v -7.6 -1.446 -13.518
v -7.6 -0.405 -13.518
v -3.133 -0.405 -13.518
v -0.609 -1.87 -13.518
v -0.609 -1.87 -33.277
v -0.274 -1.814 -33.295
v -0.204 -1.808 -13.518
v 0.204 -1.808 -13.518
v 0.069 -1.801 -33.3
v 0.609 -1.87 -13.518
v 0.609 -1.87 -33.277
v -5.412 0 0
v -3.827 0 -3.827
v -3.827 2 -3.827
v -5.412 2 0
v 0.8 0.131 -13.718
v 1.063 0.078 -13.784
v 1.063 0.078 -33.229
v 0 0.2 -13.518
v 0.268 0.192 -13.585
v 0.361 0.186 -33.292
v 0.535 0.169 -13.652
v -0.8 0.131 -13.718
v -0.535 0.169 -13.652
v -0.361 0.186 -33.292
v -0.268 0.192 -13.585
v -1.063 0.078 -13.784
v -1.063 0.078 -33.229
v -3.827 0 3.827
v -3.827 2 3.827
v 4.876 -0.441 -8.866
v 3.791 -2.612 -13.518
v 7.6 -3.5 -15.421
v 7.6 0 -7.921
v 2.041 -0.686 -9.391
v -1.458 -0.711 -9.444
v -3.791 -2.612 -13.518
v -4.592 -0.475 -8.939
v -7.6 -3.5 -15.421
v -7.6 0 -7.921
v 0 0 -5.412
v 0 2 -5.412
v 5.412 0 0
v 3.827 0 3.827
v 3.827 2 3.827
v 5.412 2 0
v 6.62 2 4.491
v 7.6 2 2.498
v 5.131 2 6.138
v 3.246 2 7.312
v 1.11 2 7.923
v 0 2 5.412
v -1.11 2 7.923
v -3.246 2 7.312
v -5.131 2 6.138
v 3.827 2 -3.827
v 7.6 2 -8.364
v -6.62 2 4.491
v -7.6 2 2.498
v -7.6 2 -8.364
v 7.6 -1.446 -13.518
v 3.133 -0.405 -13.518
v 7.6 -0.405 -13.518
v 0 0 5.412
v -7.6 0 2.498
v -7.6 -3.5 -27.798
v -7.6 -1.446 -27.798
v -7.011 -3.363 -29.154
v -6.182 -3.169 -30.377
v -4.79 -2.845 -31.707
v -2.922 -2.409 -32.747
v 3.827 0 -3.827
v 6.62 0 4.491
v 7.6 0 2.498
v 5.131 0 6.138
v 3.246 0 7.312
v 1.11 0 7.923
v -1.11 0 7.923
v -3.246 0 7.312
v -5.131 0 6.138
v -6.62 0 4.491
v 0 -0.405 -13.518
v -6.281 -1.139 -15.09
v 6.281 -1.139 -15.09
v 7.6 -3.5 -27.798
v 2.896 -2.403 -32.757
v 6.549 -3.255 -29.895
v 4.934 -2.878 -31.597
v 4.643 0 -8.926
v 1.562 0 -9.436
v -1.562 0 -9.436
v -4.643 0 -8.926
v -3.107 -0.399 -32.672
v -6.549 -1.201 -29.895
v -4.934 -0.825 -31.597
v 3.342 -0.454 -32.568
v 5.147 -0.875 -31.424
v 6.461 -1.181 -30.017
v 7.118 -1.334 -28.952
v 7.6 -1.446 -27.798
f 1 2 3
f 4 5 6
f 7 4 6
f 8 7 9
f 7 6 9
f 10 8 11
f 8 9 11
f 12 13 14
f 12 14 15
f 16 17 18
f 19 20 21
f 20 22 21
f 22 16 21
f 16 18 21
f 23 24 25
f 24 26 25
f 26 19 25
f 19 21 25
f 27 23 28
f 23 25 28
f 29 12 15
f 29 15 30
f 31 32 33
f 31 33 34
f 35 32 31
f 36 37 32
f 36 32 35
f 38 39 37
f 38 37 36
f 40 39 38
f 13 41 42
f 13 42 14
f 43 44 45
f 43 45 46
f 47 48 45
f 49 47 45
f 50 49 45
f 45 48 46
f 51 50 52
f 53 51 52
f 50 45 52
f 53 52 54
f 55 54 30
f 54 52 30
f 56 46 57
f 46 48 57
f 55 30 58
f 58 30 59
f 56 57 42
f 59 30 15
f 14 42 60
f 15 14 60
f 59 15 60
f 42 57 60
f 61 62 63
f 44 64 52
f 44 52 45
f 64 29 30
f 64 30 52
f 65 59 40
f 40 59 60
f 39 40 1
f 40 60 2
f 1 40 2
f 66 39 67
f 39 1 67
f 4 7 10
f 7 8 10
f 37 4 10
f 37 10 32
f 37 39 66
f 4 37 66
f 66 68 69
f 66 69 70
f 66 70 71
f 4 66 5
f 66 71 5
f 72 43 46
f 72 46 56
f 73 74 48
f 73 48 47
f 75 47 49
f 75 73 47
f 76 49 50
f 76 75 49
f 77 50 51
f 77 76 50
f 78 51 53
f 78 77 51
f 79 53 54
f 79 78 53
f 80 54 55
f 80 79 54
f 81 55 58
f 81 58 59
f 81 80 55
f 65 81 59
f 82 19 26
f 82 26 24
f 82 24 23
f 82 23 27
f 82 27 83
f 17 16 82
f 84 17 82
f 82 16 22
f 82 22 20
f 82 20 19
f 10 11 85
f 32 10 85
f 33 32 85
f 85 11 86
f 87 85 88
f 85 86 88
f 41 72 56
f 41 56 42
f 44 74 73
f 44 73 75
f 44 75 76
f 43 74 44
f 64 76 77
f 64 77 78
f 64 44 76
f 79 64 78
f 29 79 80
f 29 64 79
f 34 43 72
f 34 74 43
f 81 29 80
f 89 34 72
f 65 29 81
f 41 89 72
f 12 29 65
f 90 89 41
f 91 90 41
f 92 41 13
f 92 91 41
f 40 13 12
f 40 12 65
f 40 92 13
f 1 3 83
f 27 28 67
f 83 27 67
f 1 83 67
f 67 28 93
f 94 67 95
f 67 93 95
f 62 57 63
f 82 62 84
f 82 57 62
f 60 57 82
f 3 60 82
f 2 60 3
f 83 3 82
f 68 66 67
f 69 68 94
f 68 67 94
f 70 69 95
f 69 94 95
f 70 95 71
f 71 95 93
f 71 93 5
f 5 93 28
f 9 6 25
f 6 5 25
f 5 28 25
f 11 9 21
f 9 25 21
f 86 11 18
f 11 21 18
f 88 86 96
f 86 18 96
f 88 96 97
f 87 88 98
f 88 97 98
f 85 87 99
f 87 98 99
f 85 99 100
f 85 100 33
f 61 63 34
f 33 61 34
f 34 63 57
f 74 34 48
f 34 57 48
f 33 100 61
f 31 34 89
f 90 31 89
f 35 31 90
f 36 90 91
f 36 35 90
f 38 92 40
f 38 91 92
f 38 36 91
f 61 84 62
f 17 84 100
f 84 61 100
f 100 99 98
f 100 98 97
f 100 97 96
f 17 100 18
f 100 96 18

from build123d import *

# Parameters (mm, degrees)
EXTRUDE_1_DEPTH          = 2
EXTRUDE_START            = -8
EXTRUDE_2_DEPTH          = 8
CUT_EXTRUDE_1_DEPTH      = 23.468559083
CUT_EXTRUDE_1_DEPTH_BACK = 23.468559083
EXTRUDE_3_DEPTH          = 5.5
CUT_EXTRUDE_START        = 1.7
SKETCH_6_OUTSIDE_W       = 26.07
SKETCH_6_OUTSIDE_H       = 16.37
CUT_EXTRUDE_2_DEPTH      = 19.782223


with BuildPart() as part:
    # 草图1 → 凸台-拉伸1 (new body)
    with BuildSketch(Plane(origin=(0, 0, 0), x_dir=(1, 0, 0), z_dir=(0, 1, 0))):
        with BuildLine():
            Line((-7.6, -2.497999199), (-7.6, 7.9206403))
            ThreePointArc((-7.6, 7.9206403), (0, 9.5), (7.6, 7.9206403))
            Line((7.6, 7.9206403), (7.6, -2.497999199))
            ThreePointArc((7.6, -2.497999199), (0, -8), (-7.6, -2.497999199))
        make_face()
        Polygon((0, 5.411961001), (-3.826834324, 3.826834324), (-5.411961001, 0), (-3.826834324, -3.826834324), (0, -5.411961001), (3.826834324, -3.826834324), (5.411961001, 0), (3.826834324, 3.826834324), align=None, mode=Mode.SUBTRACT)
    extrude(amount=EXTRUDE_1_DEPTH)

    # 草图3 → 凸台-拉伸2 (add)
    with BuildSketch(Plane(origin=(0, 2, 0), x_dir=(1, 0, 0), z_dir=(0, 1, 0)).offset(EXTRUDE_START)):
        with BuildLine():
            Line((-7.6, 7.9206403), (-7.6, 15.4206403))
            Line((-7.6, 15.4206403), (0, 13.517776718))
            Line((0, 13.517776718), (7.6, 15.4206403))
            Line((7.6, 15.4206403), (7.6, 7.9206403))
            ThreePointArc((7.6, 7.9206403), (0, 9.5), (-7.6, 7.9206403))
        make_face()
    extrude(amount=EXTRUDE_2_DEPTH)

    # 草图4 → 切除-拉伸1 (cut, two sides: drawn at the far end of the back side and taken through both)
    with BuildSketch(Plane(origin=(7.6, 0, 0), x_dir=(0, 0, -1), z_dir=(1, 0, 0)).offset(-CUT_EXTRUDE_1_DEPTH_BACK)):
        Polygon((15.4206403, 2), (8.364338974, 2), (15.4206403, -1.292940619), align=None)
        Polygon((15.4206403, -6), (15.4206403, -3.5), (7.9206403, 0), (7.9206403, -6), align=None)
    extrude(amount=CUT_EXTRUDE_1_DEPTH + CUT_EXTRUDE_1_DEPTH_BACK, mode=Mode.SUBTRACT)

    # 草图5 → 凸台-拉伸3 (add)
    with BuildSketch(Plane(origin=(0, 2, 0), x_dir=(1, 0, 0), z_dir=(0, 1, 0))):
        with BuildLine():
            Line((-7.6, 15.4206403), (-7.6, 27.797999199))
            ThreePointArc((-7.6, 27.797999199), (0, 33.3), (7.6, 27.797999199))
            Line((7.6, 27.797999199), (7.6, 15.4206403))
            Line((7.6, 15.4206403), (0, 13.517776718))
            Line((0, 13.517776718), (-7.6, 15.4206403))
        make_face()
    extrude(amount=-EXTRUDE_3_DEPTH)

    # 草图6 outside → 切除-拉伸2 (cut)
    with BuildSketch(Plane.XY.offset(-35).offset(CUT_EXTRUDE_START)):
        with Locations((0, -0.75)):
            Rectangle(SKETCH_6_OUTSIDE_W, SKETCH_6_OUTSIDE_H)
        with BuildLine():
            Line((7.6, -1.446364095), (1.062655153, 0.077764377))
            ThreePointArc((1.062655153, 0.077764377), (0, 0.2), (-1.062655153, 0.077764377))
            Line((-1.062655153, 0.077764377), (-7.6, -1.446364095))
            Line((-7.6, -1.446364095), (-7.6, -3.5))
            Line((-7.6, -3.5), (-0.608549693, -1.870000556))
            ThreePointArc((-0.608549693, -1.870000556), (0, -1.8), (0.608549693, -1.870000556))
            Line((0.608549693, -1.870000556), (7.6, -3.5))
            Line((7.6, -3.5), (7.6, -1.446364095))
        make_face(mode=Mode.SUBTRACT)
    extrude(amount=CUT_EXTRUDE_2_DEPTH, mode=Mode.SUBTRACT)


solid = part.part
